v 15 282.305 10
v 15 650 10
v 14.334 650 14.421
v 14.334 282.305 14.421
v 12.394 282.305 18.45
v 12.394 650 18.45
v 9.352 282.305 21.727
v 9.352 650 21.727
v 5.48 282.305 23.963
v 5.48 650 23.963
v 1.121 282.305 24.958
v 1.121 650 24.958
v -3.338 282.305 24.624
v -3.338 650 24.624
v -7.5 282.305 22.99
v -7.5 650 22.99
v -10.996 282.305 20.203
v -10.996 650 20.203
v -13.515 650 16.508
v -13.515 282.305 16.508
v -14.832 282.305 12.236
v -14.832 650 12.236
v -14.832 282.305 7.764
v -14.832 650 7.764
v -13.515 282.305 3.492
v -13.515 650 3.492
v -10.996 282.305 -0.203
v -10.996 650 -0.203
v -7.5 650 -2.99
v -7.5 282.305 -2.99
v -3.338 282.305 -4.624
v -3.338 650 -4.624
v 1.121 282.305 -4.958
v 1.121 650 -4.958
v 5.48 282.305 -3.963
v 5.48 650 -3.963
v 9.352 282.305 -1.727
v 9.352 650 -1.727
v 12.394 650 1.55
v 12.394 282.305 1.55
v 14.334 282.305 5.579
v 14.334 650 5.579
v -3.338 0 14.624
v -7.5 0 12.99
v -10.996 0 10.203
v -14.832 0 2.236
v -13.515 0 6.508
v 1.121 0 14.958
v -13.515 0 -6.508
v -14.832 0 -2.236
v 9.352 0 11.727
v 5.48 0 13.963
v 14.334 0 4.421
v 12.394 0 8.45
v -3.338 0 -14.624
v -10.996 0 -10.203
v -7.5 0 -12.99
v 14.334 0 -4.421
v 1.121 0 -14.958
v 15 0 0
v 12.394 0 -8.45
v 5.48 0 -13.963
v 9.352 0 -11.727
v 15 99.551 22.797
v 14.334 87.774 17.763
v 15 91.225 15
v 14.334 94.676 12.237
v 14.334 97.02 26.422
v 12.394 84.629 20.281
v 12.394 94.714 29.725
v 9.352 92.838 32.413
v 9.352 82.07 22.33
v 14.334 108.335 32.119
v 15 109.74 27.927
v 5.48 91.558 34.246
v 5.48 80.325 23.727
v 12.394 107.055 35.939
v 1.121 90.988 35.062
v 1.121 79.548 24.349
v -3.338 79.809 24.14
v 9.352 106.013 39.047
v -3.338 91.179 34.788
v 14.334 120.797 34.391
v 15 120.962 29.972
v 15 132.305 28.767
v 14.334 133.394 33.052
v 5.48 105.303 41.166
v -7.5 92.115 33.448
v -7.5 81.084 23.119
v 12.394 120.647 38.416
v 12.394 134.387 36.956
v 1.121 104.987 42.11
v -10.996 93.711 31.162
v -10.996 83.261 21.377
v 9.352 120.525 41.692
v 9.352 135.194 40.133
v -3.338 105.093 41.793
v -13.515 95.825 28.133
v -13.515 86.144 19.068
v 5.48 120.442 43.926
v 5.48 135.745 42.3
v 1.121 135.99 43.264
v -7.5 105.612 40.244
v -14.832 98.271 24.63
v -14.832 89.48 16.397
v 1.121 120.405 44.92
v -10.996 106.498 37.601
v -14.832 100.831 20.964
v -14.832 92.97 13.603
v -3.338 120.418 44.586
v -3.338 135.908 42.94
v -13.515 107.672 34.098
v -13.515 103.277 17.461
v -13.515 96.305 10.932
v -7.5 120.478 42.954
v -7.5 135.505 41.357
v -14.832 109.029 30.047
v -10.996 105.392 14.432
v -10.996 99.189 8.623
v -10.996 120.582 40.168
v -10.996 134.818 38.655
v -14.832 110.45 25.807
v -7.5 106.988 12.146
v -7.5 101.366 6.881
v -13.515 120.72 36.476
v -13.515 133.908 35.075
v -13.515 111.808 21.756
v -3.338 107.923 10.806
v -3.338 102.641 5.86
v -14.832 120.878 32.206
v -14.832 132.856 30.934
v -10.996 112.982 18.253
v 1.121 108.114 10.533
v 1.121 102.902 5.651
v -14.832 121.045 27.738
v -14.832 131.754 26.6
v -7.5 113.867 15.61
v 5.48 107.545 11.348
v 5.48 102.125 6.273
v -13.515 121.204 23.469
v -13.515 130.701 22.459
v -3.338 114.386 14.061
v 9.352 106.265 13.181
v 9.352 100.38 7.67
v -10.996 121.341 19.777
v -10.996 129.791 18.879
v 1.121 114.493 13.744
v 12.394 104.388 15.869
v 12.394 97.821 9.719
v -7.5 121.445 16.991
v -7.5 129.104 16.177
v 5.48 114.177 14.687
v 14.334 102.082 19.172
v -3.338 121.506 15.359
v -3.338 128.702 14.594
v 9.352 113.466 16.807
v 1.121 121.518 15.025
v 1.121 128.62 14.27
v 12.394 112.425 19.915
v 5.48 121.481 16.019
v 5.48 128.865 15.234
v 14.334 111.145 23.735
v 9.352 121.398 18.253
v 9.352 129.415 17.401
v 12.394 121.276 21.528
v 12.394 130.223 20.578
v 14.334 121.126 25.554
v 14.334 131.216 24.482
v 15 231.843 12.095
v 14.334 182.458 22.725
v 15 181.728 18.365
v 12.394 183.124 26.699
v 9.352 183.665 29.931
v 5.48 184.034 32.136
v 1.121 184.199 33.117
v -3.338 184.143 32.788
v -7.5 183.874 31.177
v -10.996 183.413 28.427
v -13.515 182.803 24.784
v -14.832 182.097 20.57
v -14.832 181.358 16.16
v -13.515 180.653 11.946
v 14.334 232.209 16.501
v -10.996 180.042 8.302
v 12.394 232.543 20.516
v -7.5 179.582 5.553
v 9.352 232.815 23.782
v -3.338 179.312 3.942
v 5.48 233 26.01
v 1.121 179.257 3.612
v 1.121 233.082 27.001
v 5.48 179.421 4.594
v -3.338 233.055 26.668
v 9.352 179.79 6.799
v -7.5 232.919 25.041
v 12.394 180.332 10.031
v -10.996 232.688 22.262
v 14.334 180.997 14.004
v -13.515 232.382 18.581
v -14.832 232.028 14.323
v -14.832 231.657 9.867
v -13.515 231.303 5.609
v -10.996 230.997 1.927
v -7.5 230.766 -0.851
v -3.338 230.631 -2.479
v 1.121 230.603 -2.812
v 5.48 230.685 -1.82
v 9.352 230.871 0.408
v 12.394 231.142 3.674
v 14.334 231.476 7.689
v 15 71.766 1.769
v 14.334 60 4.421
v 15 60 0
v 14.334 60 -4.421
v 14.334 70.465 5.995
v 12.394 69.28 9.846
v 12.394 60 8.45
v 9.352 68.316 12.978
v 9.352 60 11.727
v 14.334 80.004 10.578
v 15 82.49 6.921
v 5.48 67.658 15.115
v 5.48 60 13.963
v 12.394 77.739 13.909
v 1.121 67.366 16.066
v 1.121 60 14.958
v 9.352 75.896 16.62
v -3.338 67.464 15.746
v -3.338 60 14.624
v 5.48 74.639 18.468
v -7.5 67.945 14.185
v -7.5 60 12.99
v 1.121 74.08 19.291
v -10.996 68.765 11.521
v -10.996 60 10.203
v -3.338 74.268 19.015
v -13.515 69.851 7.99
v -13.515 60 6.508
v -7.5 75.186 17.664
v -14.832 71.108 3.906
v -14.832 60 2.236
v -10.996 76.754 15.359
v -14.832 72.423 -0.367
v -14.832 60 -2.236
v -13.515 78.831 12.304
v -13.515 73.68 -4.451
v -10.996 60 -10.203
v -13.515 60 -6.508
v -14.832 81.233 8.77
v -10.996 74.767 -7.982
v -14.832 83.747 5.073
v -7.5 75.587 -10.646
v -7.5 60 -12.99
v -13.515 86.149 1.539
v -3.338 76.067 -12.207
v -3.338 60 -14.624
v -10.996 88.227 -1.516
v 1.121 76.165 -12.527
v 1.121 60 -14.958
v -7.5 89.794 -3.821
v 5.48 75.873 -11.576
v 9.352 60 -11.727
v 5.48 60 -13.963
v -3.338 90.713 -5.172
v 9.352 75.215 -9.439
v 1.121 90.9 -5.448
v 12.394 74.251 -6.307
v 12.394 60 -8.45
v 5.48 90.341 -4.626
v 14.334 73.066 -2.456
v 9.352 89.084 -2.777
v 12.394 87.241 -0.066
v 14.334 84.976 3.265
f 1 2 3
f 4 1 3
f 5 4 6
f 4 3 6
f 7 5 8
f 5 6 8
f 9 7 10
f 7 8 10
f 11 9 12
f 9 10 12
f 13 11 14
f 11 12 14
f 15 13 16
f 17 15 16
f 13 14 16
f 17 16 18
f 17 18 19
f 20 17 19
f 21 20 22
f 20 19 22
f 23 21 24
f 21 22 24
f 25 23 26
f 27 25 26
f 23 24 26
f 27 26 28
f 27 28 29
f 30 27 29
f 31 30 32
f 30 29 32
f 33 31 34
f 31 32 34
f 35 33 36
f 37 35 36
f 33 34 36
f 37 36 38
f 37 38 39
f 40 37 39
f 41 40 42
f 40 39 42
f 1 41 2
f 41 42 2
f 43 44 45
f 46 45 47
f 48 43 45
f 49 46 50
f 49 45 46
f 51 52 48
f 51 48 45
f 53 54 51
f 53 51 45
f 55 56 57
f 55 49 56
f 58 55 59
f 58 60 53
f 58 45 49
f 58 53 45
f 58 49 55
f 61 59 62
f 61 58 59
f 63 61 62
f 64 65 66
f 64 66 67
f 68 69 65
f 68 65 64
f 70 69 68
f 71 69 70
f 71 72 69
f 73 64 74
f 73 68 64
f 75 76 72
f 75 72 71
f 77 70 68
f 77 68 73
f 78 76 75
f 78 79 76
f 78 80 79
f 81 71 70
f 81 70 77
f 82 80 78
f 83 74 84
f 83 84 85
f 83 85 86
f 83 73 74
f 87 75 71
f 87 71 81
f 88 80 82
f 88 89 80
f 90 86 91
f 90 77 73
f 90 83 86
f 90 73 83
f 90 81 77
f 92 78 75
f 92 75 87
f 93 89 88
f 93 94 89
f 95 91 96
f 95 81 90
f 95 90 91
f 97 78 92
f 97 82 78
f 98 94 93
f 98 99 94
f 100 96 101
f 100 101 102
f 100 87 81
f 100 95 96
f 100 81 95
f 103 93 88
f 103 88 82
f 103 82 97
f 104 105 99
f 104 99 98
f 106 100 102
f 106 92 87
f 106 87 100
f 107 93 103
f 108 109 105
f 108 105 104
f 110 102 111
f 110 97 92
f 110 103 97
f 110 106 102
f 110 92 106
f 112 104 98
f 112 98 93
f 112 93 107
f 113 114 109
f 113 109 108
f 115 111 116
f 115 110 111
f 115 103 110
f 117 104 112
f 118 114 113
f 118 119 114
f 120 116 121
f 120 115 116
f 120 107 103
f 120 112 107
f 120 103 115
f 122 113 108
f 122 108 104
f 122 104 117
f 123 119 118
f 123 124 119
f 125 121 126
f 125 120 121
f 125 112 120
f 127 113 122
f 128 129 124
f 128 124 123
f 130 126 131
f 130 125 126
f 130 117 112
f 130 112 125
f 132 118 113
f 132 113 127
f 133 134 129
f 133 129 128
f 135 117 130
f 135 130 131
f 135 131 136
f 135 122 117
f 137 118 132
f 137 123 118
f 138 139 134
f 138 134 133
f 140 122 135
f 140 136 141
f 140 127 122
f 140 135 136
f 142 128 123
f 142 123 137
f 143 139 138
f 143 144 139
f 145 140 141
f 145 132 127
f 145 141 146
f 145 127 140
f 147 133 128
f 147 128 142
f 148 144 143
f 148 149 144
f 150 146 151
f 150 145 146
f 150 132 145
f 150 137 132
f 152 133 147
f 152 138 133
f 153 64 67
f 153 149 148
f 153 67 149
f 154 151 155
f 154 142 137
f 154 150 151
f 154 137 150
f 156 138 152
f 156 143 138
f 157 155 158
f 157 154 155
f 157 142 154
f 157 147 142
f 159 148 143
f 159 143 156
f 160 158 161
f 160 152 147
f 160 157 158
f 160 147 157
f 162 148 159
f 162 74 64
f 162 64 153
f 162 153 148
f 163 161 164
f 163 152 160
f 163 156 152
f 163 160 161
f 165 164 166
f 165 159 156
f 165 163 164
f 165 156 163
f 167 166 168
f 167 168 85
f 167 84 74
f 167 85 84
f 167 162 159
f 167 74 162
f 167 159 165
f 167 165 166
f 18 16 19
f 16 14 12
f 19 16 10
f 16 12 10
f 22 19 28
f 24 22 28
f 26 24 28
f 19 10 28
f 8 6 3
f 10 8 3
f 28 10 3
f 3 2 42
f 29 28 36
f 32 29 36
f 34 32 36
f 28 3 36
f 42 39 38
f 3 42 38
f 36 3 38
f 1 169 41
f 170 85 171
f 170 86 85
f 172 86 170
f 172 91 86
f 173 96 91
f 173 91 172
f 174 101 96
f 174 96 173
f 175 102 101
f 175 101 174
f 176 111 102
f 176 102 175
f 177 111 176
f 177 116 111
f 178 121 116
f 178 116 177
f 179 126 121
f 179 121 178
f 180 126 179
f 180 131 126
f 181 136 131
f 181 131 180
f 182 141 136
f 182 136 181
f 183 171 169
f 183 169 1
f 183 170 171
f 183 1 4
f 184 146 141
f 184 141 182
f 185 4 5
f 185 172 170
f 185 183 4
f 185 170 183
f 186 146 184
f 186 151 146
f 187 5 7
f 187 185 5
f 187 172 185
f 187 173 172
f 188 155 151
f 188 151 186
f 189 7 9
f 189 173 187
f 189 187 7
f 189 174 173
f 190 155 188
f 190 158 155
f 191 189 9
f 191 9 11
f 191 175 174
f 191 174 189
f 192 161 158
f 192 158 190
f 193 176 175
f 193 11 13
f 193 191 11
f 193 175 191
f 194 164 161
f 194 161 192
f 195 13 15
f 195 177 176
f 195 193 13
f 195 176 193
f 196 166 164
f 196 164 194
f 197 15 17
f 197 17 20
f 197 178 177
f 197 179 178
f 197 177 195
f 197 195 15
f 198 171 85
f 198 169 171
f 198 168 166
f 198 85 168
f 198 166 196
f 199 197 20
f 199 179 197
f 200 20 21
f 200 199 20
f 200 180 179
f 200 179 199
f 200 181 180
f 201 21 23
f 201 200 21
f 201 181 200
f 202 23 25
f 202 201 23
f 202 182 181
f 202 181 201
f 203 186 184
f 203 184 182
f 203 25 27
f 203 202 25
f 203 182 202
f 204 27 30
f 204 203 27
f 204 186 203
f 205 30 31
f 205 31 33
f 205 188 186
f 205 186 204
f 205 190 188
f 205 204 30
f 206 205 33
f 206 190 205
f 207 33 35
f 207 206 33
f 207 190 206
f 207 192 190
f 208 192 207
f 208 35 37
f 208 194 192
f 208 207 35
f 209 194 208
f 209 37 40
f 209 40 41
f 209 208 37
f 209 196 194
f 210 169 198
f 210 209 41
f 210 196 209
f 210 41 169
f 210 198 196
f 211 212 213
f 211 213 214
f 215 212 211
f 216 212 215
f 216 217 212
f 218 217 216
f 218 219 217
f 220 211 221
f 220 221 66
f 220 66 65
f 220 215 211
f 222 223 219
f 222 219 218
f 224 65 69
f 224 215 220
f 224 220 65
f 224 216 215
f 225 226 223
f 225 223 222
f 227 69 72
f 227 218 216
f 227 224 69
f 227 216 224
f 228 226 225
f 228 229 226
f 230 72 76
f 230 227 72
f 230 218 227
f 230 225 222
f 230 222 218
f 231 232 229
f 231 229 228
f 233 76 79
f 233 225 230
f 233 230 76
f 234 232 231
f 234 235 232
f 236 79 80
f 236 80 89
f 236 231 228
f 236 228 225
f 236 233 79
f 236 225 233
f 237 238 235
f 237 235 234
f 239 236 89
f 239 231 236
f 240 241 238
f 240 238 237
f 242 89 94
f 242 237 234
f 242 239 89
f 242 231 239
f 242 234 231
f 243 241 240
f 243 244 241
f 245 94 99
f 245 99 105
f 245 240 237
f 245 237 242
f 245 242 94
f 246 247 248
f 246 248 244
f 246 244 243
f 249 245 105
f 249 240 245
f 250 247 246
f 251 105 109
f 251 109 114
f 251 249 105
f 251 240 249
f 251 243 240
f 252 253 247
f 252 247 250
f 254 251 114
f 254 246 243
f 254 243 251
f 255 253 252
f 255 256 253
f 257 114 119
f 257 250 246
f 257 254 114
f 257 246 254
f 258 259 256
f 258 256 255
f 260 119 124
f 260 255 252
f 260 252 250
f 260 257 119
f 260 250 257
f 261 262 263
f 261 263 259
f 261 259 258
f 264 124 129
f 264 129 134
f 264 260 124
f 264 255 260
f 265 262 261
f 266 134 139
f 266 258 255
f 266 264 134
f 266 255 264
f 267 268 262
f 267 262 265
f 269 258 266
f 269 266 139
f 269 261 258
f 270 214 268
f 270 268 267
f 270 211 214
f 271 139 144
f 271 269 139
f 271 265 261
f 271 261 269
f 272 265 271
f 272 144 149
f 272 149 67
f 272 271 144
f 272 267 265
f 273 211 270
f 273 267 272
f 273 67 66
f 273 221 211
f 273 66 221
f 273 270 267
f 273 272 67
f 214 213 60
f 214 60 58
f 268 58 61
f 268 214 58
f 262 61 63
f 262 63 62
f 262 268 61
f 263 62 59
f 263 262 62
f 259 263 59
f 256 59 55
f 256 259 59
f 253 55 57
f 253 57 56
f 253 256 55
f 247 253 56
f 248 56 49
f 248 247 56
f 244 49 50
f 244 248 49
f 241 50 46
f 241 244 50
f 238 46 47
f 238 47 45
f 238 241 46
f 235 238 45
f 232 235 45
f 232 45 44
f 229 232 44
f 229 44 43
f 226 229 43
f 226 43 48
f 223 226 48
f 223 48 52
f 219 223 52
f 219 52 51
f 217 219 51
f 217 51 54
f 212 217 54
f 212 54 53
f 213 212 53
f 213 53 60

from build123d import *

# Parameters (mm, degrees)
F1_R = 15


with BuildPart() as f3:
    # F3: sweep along a path in F0
    with BuildLine(Plane.YZ) as f3_path:
        Line((0, 0), (60, 0))
        ThreePointArc((60, 0), (77.320508, 3.944487), (91.22499, 15))
        ThreePointArc((91.22499, 15), (109.739598, 27.926853), (132.304801, 28.767029))
        ThreePointArc((132.304801, 28.767029), (206.720078, 14.709975), (282.304801, 10))
        Line((282.304801, 10), (650, 10))
    # F1 (on Front) → F3 (sweep)
    with BuildSketch(Plane.XZ):
        Circle(F1_R)
    sweep(path=f3_path.line)


solid = f3.part
